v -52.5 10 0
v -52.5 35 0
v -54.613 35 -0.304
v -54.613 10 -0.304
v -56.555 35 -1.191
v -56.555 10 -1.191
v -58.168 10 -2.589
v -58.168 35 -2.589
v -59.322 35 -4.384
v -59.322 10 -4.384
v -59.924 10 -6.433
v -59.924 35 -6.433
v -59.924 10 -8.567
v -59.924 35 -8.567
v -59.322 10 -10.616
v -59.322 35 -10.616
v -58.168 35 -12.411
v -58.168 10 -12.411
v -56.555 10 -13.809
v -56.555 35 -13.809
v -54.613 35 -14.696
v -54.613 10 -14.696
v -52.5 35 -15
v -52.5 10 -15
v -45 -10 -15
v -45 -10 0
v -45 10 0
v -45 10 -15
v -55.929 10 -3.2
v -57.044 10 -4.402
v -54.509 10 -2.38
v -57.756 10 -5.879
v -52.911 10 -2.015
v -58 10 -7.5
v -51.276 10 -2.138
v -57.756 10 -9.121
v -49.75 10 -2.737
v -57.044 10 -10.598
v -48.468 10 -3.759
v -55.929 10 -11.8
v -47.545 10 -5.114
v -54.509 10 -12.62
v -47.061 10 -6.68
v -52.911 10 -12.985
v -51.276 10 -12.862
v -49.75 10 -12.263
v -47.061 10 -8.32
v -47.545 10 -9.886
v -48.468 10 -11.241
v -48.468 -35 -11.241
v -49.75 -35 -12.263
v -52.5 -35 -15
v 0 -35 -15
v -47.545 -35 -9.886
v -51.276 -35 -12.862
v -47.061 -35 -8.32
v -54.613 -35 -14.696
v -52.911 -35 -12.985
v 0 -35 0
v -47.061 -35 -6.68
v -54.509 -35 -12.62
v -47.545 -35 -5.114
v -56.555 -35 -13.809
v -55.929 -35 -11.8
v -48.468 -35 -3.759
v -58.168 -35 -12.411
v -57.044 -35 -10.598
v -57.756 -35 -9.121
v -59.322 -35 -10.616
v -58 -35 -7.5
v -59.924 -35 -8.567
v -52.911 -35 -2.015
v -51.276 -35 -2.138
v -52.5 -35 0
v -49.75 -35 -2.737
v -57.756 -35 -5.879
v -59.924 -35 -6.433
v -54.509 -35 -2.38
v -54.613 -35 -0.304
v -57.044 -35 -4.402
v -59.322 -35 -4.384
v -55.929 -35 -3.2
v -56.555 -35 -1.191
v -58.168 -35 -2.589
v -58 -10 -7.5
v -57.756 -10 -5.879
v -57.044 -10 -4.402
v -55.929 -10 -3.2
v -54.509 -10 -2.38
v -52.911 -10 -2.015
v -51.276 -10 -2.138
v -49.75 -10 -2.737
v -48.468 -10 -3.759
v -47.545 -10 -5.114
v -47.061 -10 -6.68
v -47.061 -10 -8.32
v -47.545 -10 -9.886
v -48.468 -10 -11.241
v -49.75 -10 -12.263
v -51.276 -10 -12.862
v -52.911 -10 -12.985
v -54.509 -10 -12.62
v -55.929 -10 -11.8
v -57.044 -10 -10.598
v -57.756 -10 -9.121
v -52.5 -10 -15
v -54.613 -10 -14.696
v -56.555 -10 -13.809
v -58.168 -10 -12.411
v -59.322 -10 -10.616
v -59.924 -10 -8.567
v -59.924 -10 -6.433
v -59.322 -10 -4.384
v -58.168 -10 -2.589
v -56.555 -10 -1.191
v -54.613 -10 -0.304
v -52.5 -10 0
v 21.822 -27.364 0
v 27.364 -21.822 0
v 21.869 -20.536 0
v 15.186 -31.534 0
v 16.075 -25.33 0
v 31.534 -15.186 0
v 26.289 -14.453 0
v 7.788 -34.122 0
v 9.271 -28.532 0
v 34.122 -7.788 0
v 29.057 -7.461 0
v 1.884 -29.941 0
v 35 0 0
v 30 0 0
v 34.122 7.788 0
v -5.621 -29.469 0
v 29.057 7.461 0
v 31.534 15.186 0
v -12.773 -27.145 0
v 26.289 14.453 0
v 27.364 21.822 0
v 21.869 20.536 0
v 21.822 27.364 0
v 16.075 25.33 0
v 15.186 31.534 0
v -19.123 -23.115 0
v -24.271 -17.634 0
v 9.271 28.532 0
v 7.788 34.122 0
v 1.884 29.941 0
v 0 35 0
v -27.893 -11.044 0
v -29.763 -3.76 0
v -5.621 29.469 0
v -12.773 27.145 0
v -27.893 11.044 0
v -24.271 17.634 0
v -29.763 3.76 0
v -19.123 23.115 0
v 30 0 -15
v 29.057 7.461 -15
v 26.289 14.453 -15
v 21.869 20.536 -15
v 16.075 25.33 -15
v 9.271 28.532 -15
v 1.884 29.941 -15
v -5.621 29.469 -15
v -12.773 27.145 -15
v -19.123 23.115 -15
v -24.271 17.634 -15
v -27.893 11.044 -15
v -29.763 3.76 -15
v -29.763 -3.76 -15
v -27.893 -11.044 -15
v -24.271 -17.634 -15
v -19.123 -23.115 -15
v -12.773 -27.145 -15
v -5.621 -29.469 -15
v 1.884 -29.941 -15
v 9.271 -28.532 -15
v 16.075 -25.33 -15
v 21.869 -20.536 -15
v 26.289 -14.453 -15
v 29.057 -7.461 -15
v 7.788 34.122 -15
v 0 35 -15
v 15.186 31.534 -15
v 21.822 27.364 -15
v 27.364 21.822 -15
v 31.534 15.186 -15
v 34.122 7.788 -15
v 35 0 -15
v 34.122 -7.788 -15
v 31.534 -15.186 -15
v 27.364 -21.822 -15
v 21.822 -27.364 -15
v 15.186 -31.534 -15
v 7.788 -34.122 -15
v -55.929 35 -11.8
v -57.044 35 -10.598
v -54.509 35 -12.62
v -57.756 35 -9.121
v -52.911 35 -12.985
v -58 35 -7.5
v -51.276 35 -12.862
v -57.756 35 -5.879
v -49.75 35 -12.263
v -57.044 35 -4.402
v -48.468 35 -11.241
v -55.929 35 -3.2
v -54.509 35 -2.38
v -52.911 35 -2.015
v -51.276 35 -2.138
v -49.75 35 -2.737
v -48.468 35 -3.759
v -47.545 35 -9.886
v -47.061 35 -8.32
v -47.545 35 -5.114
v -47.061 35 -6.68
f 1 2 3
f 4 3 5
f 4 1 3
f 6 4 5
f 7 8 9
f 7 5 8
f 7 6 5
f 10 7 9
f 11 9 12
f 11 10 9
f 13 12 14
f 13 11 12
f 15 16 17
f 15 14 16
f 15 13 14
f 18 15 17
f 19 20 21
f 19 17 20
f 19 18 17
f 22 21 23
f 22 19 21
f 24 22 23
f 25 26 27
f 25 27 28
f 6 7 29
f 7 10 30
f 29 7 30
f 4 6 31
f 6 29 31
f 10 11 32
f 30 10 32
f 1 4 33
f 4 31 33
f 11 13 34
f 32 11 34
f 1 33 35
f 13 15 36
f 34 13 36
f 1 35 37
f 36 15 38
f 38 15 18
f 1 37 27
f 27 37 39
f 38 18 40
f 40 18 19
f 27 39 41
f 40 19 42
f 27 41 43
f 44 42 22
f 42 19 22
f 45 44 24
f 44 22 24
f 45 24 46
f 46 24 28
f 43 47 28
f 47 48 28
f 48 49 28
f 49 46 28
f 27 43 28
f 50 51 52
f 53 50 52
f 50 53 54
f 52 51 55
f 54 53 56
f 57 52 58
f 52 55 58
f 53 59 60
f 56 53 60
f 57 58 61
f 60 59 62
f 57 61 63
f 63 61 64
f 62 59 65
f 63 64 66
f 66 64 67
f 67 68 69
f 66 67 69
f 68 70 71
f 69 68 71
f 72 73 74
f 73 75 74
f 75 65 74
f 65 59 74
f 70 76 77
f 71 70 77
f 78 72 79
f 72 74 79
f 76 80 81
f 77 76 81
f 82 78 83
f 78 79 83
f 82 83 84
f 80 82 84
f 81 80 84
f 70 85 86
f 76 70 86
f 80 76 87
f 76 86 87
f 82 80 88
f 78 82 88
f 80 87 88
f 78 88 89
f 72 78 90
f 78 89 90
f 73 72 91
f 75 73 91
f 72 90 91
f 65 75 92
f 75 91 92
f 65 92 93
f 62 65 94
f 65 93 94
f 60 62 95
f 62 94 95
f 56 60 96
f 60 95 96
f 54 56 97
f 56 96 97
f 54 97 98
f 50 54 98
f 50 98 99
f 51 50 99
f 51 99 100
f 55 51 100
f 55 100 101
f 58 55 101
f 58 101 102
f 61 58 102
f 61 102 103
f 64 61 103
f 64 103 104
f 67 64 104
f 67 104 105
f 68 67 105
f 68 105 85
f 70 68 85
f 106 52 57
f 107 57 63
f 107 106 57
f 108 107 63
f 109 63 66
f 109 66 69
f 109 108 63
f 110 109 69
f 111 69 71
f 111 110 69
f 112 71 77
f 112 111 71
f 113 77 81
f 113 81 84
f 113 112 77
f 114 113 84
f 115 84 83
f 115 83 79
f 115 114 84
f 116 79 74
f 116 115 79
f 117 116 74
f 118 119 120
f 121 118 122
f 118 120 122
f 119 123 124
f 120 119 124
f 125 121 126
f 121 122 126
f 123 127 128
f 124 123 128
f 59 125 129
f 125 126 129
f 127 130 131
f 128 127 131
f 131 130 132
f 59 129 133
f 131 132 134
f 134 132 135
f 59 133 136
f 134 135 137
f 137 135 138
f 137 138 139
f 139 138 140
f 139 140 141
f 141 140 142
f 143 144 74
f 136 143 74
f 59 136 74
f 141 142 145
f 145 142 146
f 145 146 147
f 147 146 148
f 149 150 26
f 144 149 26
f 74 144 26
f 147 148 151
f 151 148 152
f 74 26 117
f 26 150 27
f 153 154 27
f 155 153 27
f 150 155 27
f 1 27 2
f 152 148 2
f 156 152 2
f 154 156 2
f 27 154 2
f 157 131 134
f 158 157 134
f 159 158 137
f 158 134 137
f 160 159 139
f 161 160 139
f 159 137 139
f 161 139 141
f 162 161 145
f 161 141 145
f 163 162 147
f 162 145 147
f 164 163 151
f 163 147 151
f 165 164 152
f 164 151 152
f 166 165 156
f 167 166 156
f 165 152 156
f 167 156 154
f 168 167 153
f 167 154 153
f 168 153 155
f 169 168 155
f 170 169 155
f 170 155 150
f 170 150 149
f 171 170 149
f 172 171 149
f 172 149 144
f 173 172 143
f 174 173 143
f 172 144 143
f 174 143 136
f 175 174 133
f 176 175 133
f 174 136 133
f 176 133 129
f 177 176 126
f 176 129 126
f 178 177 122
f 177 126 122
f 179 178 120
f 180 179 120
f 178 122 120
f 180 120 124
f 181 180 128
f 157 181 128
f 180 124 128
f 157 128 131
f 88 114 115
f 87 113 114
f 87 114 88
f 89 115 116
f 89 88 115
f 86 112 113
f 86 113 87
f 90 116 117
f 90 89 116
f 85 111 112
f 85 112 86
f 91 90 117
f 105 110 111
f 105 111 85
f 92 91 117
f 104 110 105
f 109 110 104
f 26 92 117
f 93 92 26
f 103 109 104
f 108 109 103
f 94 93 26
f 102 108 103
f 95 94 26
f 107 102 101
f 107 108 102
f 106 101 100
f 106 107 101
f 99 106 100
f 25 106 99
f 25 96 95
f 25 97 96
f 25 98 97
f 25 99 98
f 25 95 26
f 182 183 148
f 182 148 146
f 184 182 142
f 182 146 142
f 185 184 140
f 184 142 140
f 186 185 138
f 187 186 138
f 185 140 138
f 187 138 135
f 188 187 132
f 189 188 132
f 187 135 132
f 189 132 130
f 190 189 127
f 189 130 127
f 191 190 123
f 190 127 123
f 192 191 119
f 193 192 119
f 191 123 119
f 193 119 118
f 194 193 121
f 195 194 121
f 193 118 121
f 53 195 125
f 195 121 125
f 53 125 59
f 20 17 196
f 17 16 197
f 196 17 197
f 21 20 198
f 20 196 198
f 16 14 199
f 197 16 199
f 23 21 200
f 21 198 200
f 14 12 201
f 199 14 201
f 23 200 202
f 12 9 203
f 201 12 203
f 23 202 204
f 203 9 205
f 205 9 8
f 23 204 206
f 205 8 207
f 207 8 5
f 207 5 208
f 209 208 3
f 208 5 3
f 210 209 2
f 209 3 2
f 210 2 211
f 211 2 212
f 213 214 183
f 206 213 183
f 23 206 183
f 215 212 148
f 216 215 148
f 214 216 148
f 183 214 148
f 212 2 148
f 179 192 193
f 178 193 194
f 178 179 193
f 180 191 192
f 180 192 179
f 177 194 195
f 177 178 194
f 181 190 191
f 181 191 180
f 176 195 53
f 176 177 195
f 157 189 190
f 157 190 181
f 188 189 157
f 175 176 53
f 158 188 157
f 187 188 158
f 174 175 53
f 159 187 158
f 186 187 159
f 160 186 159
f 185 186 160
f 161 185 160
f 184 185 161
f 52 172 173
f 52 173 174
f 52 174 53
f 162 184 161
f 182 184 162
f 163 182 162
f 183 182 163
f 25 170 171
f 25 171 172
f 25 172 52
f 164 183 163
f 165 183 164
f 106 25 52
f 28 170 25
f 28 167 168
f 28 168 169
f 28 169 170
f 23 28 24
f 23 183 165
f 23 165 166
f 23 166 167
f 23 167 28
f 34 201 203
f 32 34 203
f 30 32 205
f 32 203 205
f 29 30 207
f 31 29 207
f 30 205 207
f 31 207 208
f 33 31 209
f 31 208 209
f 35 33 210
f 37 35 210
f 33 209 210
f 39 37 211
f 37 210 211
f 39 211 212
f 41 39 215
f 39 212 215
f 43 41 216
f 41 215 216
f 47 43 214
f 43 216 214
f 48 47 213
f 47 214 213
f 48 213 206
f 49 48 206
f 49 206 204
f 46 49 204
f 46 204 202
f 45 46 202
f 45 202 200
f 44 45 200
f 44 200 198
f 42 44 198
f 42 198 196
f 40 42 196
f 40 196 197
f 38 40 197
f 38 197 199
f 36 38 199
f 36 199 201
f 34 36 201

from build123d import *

# Parameters (mm, degrees)
PROFILE_SKETCH_R      = 30
PROFILE_EXTRUDE_DEPTH = 15
HOLE_SKETCH_R         = 5.5
HOLE_CUT_DEPTH        = 70
GAP_CUT_DEPTH         = 10
GAP_CUT_DEPTH_BACK    = 10
GAP_SKETCH_W          = 15
GAP_SKETCH_H          = 15
UPPER_FILLET_RADIUS   = 7.5
UPPER_FILLET_LENGTH   = 25
LOWER_FILLET_RADIUS   = 7.5
LOWER_FILLET_LENGTH   = 25


with BuildPart() as part:
    # Profile Sketch → Profile Extrude (new body)
    with BuildSketch(Plane.XY):
        with BuildLine():
            Line((-60, 35), (0, 35))
            ThreePointArc((0, 35), (35, 0), (0, -35))
            Line((0, -35), (-60, -35))
            Line((-60, -35), (-60, 35))
        make_face()
        Circle(PROFILE_SKETCH_R, mode=Mode.SUBTRACT)
    extrude(amount=-PROFILE_EXTRUDE_DEPTH)

    # Hole Sketch → Hole Cut (cut)
    with BuildSketch(Plane(origin=(0, 35, 0), x_dir=(1, 0, 0), z_dir=(0, 1, 0))):
        with Locations(Location((-52.5, 7.5, 0), (0, 0, 180))):
            Circle(HOLE_SKETCH_R)
    extrude(amount=-HOLE_CUT_DEPTH, mode=Mode.SUBTRACT)

    # Gap Sketch → Gap Cut (cut, two sides: drawn at the far end of the back side and taken through both)
    with BuildSketch(Plane(origin=(0, 0, 0), x_dir=(1, 0, 0), z_dir=(0, 1, 0)).offset(-GAP_CUT_DEPTH_BACK)):
        with Locations((-52.5, 7.5)):
            Rectangle(GAP_SKETCH_W, GAP_SKETCH_H)
    extrude(amount=GAP_CUT_DEPTH + GAP_CUT_DEPTH_BACK, mode=Mode.SUBTRACT)

    # Upper Fillet: full round fillet: the end face becomes a half cylinder, R = half its width
    upper_fillet_face = Plane((-60, 22.5, -7.5), x_dir=(0, -1, 0), z_dir=(-1, 0, 0))  # on the end face: x along it, z out of the body
    upper_fillet_slab = upper_fillet_face.offset(-UPPER_FILLET_RADIUS / 2) * Box(UPPER_FILLET_LENGTH, 2 * UPPER_FILLET_RADIUS, UPPER_FILLET_RADIUS, mode=Mode.PRIVATE)  # the body's end, R deep
    upper_fillet_round = Plane((-52.5, 22.5, -7.5), x_dir=(-1, 0, 0), z_dir=(0, -1, 0)) * Cylinder(UPPER_FILLET_RADIUS, UPPER_FILLET_LENGTH, mode=Mode.PRIVATE)  # its axis R under the face
    add(upper_fillet_slab - upper_fillet_round, mode=Mode.SUBTRACT)

    # Lower Fillet: full round fillet: the end face becomes a half cylinder, R = half its width
    lower_fillet_face = Plane((-60, -22.5, -7.5), x_dir=(0, 1, 0), z_dir=(-1, 0, 0))  # on the end face: x along it, z out of the body
    lower_fillet_slab = lower_fillet_face.offset(-LOWER_FILLET_RADIUS / 2) * Box(LOWER_FILLET_LENGTH, 2 * LOWER_FILLET_RADIUS, LOWER_FILLET_RADIUS, mode=Mode.PRIVATE)  # the body's end, R deep
    lower_fillet_round = Plane((-52.5, -22.5, -7.5), x_dir=(-1, 0, 0), z_dir=(0, 1, 0)) * Cylinder(LOWER_FILLET_RADIUS, LOWER_FILLET_LENGTH, mode=Mode.PRIVATE)  # its axis R under the face
    add(lower_fillet_slab - lower_fillet_round, mode=Mode.SUBTRACT)


solid = part.part
